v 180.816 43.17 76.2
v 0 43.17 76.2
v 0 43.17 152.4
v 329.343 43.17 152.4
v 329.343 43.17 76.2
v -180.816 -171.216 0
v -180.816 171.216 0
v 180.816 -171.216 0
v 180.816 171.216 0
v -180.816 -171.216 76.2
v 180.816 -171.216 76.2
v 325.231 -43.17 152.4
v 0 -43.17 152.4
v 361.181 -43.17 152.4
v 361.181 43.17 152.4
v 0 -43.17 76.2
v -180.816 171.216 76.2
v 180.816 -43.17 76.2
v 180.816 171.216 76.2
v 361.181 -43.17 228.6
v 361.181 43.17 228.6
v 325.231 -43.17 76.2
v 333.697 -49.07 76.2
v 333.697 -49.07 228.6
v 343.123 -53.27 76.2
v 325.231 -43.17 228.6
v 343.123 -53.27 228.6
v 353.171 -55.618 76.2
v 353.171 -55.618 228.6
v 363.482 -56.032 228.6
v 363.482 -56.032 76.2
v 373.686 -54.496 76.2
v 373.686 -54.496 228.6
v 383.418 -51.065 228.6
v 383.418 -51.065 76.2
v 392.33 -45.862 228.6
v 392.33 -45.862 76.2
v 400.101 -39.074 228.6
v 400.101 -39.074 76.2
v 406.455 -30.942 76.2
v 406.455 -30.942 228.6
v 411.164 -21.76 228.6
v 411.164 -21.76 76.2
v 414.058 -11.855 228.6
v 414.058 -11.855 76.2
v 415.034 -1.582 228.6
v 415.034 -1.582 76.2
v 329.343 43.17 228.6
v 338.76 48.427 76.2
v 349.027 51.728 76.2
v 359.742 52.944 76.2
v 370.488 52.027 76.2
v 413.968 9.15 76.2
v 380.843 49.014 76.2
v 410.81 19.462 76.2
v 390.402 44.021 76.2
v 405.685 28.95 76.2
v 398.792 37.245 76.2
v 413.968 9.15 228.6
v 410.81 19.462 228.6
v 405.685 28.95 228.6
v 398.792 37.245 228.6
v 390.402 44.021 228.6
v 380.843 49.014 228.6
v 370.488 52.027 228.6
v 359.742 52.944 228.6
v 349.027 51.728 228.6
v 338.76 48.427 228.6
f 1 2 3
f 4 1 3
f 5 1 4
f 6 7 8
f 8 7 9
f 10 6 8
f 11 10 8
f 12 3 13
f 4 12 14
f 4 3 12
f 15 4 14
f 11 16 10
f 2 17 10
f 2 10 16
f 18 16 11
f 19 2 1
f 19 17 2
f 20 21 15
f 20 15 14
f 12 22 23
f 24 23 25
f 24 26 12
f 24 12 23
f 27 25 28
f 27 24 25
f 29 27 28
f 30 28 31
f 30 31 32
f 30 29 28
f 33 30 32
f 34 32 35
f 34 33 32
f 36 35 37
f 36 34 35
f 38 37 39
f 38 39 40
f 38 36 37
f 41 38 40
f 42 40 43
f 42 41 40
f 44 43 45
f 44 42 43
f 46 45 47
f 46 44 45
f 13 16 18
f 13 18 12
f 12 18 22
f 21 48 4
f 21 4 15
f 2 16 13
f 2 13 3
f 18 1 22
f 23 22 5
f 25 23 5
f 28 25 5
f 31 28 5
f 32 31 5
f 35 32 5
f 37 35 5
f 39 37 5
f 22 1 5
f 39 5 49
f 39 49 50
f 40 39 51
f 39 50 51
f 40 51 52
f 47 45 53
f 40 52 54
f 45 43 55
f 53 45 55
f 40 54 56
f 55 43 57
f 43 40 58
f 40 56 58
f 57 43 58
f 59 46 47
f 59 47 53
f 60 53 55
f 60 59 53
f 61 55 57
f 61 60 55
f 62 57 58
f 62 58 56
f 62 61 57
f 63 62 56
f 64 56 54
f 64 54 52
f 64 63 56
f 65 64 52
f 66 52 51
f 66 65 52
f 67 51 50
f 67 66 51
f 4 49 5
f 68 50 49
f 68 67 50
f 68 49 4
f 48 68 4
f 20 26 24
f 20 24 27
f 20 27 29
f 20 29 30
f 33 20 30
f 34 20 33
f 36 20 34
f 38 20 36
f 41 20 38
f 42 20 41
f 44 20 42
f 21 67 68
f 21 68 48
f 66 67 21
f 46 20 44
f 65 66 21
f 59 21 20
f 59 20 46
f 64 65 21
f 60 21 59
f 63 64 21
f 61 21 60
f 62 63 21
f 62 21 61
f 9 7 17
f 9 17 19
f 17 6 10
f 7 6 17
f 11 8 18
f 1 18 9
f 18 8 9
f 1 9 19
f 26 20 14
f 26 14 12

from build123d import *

# Parameters (mm, degrees)
F0_W     = 361.632824
F0_H     = 342.431128
F2_DEPTH = 76.2
F1_W     = 361.180782
F1_H     = 86.339838
F3_DEPTH = 152.4
F5_DEPTH = 76.2
F6_W     = 180.36437
F6_H     = 76.2
F7_DEPTH = 214.386483


with BuildPart() as f2:
    # F0 (on Top) → F2 (new body)
    with BuildSketch(Plane.XY):
        Rectangle(F0_W, F0_H)
    extrude(amount=F2_DEPTH)

    # F1 (on Top) → F3 (join)
    with BuildSketch(Plane.XY):
        with Locations((180.590391, 0)):
            Rectangle(F1_W, F1_H)
    extrude(amount=F3_DEPTH)

    # F4 (on face) → F5 (join, symmetric)
    with BuildSketch(Plane.XY.offset(152.4)):
        with BuildLine():
            ThreePointArc((325.230616, -43.169919), (383.41811, -51.064962), (415.034036, -1.582143))
            ThreePointArc((415.034036, -1.582143), (385.746466, 46.754361), (329.343175, 43.169919))
            Line((329.343175, 43.169919), (361.180782, 43.169919))
            Line((361.180782, 43.169919), (361.180782, -43.169919))
            Line((361.180782, -43.169919), (325.230616, -43.169919))
        make_face()
    extrude(amount=F5_DEPTH, both=True)

    # F6 (on face) → F7 (cut, through all)
    with BuildSketch(Plane(origin=(0, 43.169919, 0), x_dir=(-1, 0, 0), z_dir=(0, 1, 0))):
        with Locations((-270.998597, 38.1)):
            Rectangle(F6_W, F6_H)
    extrude(amount=-F7_DEPTH, mode=Mode.SUBTRACT)


solid = f2.part
